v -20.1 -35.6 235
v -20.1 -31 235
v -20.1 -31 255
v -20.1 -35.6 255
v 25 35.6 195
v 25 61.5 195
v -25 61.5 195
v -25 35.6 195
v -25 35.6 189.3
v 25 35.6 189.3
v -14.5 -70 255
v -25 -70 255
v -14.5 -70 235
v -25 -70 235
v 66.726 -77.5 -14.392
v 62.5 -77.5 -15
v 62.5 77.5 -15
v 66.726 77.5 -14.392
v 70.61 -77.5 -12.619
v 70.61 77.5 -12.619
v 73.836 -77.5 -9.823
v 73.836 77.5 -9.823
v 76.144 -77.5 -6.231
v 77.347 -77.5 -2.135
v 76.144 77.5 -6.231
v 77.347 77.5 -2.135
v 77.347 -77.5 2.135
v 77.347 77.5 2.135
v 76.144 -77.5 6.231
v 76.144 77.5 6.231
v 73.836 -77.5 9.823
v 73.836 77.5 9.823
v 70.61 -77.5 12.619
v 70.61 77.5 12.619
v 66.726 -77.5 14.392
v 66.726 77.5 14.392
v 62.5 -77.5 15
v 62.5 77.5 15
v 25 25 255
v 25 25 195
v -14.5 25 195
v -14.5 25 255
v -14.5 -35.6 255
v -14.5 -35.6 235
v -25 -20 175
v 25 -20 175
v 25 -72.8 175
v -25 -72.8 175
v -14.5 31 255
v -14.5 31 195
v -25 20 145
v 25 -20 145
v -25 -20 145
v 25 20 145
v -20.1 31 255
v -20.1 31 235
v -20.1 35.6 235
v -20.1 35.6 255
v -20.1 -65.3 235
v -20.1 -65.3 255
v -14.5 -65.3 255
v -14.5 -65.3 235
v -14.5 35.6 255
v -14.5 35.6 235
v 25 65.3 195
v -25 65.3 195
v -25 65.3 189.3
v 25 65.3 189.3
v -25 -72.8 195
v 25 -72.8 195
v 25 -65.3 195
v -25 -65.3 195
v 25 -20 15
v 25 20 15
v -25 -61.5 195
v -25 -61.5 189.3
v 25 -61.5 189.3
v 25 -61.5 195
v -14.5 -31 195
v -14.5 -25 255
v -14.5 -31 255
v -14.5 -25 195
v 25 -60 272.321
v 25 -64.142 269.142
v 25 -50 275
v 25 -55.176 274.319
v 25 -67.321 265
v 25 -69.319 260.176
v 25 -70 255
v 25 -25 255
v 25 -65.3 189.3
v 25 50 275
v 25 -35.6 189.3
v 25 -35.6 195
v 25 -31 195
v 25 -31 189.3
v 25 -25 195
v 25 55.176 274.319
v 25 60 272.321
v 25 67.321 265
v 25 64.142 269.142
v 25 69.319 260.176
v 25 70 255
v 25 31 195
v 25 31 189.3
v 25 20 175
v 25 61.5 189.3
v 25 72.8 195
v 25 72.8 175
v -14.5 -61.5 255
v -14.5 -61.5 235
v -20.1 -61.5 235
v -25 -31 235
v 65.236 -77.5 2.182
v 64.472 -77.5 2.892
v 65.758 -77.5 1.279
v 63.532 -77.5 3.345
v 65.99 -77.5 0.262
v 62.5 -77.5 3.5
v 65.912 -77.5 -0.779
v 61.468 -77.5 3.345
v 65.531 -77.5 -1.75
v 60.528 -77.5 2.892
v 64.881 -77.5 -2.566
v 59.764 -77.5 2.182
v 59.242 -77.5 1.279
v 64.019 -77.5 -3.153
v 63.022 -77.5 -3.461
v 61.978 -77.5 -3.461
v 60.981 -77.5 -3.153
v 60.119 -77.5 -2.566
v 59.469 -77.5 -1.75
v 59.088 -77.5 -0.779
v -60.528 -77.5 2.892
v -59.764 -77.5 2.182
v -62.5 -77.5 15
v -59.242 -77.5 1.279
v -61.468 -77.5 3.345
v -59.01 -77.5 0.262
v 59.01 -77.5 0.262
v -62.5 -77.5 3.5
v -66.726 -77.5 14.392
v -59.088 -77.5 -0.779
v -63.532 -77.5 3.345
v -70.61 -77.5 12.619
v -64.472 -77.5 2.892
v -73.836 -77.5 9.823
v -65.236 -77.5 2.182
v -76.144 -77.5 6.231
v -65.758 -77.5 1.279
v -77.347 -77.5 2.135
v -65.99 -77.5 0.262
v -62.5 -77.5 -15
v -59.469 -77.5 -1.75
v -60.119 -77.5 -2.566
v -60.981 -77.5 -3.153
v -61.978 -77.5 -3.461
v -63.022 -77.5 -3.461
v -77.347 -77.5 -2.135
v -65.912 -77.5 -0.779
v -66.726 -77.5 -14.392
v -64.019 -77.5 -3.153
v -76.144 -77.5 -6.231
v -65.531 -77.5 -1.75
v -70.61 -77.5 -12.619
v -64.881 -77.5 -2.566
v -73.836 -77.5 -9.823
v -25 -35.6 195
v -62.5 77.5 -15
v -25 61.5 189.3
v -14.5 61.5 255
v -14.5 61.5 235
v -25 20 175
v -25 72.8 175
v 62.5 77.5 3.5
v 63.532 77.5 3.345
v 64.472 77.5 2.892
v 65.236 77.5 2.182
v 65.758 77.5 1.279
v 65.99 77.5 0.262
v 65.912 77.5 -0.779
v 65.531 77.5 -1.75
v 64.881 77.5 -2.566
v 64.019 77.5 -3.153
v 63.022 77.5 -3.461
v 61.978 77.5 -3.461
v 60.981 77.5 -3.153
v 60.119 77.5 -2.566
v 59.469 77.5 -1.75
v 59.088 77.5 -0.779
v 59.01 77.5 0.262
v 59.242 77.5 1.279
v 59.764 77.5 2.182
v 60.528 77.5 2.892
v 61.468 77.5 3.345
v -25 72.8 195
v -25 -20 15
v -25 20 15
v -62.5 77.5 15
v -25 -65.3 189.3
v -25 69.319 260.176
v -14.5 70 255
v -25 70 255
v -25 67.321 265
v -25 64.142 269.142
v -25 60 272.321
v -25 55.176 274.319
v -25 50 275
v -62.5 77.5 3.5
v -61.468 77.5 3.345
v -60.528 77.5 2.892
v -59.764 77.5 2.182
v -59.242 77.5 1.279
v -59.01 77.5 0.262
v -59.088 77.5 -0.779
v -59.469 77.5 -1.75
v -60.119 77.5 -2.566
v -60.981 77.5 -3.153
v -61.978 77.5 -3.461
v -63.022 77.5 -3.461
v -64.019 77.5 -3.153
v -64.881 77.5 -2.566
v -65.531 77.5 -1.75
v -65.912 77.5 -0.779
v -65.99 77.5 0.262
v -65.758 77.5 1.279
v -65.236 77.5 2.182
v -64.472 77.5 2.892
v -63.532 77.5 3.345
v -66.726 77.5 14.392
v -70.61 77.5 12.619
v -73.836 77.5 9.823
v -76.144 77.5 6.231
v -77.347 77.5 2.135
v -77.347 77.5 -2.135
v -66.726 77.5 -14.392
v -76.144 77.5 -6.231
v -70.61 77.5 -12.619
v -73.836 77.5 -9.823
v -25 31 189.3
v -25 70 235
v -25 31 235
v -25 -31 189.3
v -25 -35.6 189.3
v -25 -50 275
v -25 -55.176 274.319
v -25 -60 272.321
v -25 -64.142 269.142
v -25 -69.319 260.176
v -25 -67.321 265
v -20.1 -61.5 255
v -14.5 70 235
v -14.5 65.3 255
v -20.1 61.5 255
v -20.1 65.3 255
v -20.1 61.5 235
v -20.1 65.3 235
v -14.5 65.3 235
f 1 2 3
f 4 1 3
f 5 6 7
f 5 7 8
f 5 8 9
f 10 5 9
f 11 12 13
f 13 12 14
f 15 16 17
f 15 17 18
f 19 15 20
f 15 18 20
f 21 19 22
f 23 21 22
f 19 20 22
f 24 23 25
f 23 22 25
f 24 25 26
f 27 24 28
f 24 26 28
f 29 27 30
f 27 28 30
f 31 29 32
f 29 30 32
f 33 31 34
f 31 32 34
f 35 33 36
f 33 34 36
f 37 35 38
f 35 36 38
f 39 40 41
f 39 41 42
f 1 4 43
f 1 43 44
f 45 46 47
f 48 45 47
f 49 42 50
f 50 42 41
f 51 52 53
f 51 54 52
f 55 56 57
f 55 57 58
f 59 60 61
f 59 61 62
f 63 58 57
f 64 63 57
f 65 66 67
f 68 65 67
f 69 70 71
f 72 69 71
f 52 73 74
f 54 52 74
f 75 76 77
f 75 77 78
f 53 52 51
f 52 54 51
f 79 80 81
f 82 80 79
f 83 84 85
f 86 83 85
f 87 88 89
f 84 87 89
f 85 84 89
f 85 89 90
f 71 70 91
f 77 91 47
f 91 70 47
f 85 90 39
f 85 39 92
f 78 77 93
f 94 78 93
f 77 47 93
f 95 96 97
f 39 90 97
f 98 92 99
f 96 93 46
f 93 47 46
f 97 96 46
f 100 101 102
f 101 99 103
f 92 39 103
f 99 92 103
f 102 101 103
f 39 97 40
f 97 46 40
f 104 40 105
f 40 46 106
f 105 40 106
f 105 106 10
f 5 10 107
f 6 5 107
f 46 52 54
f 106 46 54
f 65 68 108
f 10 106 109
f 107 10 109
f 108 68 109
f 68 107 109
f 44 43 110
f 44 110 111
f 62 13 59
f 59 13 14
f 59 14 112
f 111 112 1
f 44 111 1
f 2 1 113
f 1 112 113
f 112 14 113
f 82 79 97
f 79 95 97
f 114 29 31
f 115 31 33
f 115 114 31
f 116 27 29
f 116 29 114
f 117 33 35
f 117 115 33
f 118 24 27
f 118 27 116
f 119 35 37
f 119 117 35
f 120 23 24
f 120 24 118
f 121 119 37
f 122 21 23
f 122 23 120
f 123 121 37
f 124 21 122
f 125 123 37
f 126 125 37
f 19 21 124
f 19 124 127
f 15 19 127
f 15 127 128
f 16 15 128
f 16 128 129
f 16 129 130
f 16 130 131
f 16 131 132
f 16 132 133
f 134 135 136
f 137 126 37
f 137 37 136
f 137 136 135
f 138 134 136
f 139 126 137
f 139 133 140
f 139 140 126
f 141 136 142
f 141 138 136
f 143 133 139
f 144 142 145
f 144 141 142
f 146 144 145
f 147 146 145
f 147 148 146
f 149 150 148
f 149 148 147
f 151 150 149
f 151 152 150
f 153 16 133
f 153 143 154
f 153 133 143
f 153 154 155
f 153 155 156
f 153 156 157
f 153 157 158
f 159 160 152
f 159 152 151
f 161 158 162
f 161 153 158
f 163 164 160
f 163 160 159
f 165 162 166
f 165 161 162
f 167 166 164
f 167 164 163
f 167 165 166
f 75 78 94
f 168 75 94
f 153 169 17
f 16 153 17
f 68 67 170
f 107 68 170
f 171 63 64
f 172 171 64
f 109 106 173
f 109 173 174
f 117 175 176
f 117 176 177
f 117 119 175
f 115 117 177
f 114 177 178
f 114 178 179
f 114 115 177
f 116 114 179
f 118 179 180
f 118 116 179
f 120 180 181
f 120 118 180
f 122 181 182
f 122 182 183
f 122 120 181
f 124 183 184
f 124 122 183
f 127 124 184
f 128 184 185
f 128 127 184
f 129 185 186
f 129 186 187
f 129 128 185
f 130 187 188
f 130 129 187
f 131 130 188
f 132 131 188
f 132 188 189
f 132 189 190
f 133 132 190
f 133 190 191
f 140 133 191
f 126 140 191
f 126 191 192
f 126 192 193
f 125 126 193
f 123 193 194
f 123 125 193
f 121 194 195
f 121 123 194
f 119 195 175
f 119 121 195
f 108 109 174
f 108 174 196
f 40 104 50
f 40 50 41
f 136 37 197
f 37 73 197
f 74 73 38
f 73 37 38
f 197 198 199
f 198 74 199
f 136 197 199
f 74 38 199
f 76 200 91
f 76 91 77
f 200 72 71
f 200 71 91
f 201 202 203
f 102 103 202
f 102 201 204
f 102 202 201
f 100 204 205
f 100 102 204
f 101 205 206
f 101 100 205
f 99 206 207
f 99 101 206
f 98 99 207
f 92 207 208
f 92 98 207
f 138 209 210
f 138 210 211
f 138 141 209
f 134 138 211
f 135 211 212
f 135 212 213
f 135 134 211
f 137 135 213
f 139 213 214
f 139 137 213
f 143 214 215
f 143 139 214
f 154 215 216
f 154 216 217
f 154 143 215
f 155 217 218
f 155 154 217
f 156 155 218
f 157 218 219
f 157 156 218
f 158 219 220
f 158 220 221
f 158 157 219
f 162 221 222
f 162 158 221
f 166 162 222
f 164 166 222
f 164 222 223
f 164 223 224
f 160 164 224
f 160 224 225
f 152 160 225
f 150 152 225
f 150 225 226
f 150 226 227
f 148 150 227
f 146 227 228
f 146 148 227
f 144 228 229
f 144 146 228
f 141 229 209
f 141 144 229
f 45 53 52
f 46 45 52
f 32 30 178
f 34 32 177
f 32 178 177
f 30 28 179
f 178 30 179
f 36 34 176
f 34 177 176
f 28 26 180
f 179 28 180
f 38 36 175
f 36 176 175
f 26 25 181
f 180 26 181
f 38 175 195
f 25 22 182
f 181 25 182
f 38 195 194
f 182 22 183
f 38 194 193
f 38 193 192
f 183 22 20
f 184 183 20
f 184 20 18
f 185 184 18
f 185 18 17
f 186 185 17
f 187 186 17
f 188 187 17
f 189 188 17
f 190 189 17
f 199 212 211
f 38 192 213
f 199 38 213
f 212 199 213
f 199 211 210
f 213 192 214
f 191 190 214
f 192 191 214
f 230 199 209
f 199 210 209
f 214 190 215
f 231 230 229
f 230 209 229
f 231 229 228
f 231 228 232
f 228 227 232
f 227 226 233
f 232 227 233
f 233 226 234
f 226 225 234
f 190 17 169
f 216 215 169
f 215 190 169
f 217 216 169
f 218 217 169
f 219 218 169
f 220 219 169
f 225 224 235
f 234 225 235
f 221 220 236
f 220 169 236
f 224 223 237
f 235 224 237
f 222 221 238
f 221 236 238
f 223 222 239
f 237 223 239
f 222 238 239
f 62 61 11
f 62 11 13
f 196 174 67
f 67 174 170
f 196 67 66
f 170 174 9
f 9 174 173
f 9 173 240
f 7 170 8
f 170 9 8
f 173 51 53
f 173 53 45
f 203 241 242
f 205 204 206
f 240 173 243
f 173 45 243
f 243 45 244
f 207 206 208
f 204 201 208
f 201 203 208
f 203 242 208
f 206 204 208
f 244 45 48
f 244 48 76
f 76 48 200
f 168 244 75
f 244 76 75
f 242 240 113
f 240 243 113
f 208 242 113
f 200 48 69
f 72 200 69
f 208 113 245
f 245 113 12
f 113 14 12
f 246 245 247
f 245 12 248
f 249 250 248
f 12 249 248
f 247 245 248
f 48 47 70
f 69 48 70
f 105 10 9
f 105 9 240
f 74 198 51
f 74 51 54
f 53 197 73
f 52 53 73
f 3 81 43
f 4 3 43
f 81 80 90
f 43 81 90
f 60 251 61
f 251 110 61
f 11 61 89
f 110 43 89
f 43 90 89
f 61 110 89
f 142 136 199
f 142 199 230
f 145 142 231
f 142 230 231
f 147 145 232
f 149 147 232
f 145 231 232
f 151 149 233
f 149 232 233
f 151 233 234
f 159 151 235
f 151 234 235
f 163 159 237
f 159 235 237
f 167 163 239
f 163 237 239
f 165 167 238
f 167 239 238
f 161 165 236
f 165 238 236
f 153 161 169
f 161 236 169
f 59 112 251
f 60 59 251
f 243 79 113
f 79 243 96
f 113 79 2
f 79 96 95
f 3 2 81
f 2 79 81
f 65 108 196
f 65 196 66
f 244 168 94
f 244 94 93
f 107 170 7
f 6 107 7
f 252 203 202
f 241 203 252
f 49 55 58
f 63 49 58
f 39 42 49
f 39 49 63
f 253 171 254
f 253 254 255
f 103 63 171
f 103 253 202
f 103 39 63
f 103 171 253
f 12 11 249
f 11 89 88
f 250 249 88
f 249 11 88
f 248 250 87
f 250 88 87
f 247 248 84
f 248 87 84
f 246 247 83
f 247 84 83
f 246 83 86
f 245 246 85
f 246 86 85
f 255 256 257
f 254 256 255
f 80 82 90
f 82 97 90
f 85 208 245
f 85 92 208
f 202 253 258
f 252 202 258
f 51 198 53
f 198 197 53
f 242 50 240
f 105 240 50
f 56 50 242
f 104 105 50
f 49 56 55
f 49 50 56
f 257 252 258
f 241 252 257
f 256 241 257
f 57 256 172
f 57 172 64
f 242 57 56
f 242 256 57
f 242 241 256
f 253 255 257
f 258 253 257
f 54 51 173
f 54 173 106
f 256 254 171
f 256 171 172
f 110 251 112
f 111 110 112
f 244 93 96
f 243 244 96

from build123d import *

# Parameters (mm, degrees)
SKETCH1_R                       = 3.5
BOSS_EXTRUDE1_DEPTH             = 77.5
SKETCH2_W                       = 50
SKETCH2_H                       = 40
BOSS_EXTRUDE2_DEPTH             = 260
BOSS_EXTRUDE4_REACH             = 298.036
BOSS_EXTRUDE4_DIRECTION_2_REACH = 298.036
SKETCH6_W                       = 20
SKETCH6_H                       = 45
BOSS_EXTRUDE5_DEPTH             = 4.9
SKETCH9_W                       = 20
SKETCH9_H                       = 4.7
SKETCH9_W_2                     = 60
SKETCH9_H_2                     = 6
SKETCH9_H_3                     = 25.9
BOSS_EXTRUDE7_DEPTH             = 5.6
SKETCH11_W                      = 40
SKETCH11_H                      = 6
BOSS_EXTRUDE8_DEPTH             = 4.9


with BuildPart() as part:
    # Sketch1 → Boss-Extrude1 (new, symmetric)
    with BuildSketch(Plane(origin=(0, 0, 0), x_dir=(1, 0, 0), z_dir=(0, 1, 0))):
        with BuildLine():
            Line((-62.5, 15), (62.5, 15))
            ThreePointArc((62.5, 15), (77.5, 0), (62.5, -15))
            Line((62.5, -15), (-62.5, -15))
            ThreePointArc((-62.5, -15), (-77.5, 0), (-62.5, 15))
        make_face()
        with Locations(Location((-62.5, 0, 0), (0, 0, 270))):
            Circle(SKETCH1_R, mode=Mode.SUBTRACT)
        with Locations(Location((62.5, 0, 0), (0, 0, 270))):
            Circle(SKETCH1_R, mode=Mode.SUBTRACT)
    extrude(amount=BOSS_EXTRUDE1_DEPTH, both=True)

    # Sketch2 → Boss-Extrude2 (add)
    with BuildSketch(Plane.XY.offset(15)):
        Rectangle(SKETCH2_W, SKETCH2_H)
    extrude(amount=BOSS_EXTRUDE2_DEPTH)

    # Boss-Extrude4: up to this face of the body (flat: up to its plane)
    boss_extrude4_end = Plane(part.part.faces().sort_by_distance((25, 0, 145))[0])
    # Sketch5 → Boss-Extrude4 (add, up to the picked face)
    with BuildSketch(Plane(origin=(0, 0, 0), x_dir=(0, 0, -1), z_dir=(1, 0, 0)), mode=Mode.PRIVATE) as boss_extrude4_sk1:
        with BuildLine():
            Line((-275, -20), (-175, -20))
            Line((-175, -20), (-175, -72.8))
            Line((-175, -72.8), (-195, -72.8))
            Line((-195, -72.8), (-195, -65.3))
            Line((-195, -65.3), (-189.3, -65.3))
            Line((-189.3, -65.3), (-189.3, -61.5))
            Line((-189.3, -61.5), (-195, -61.5))
            Line((-195, -61.5), (-195, -35.6))
            Line((-195, -35.6), (-189.3, -35.6))
            Line((-189.3, -35.6), (-189.3, -31))
            Line((-189.3, -31), (-195, -31))
            Line((-195, -31), (-195, -25))
            Line((-195, -25), (-255, -25))
            Line((-255, -25), (-255, -70))
            ThreePointArc((-255, -70), (-269.142135624, -64.142135624), (-275, -50))
            Line((-275, -50), (-275, -20))
        make_face()
    boss_extrude4_tool1 = split(extrude(boss_extrude4_sk1.sketch, amount=BOSS_EXTRUDE4_REACH, mode=Mode.PRIVATE), bisect_by=boss_extrude4_end, keep=Keep.BOTH, mode=Mode.PRIVATE)
    boss_extrude4 = boss_extrude4_tool1.solids().sort_by(Axis((0, -21.130833, 225), (1, 0, 0)))[0]
    add(boss_extrude4)

    # Boss-Extrude4 direction 2: up to this face of the body (flat: up to its plane)
    boss_extrude4_direction_2_end = Plane(part.part.faces().sort_by_distance((-25, 0, 145))[0])
    # Sketch5 → Boss-Extrude4 direction 2 (add, up to the picked face)
    with BuildSketch(Plane(origin=(0, 0, 0), x_dir=(0, 0, -1), z_dir=(1, 0, 0)), mode=Mode.PRIVATE) as boss_extrude4_direction_2_sk1:
        with BuildLine():
            Line((-275, -20), (-175, -20))
            Line((-175, -20), (-175, -72.8))
            Line((-175, -72.8), (-195, -72.8))
            Line((-195, -72.8), (-195, -65.3))
            Line((-195, -65.3), (-189.3, -65.3))
            Line((-189.3, -65.3), (-189.3, -61.5))
            Line((-189.3, -61.5), (-195, -61.5))
            Line((-195, -61.5), (-195, -35.6))
            Line((-195, -35.6), (-189.3, -35.6))
            Line((-189.3, -35.6), (-189.3, -31))
            Line((-189.3, -31), (-195, -31))
            Line((-195, -31), (-195, -25))
            Line((-195, -25), (-255, -25))
            Line((-255, -25), (-255, -70))
            ThreePointArc((-255, -70), (-269.142135624, -64.142135624), (-275, -50))
            Line((-275, -50), (-275, -20))
        make_face()
    boss_extrude4_direction_2_tool1 = split(extrude(boss_extrude4_direction_2_sk1.sketch, amount=-BOSS_EXTRUDE4_DIRECTION_2_REACH, mode=Mode.PRIVATE), bisect_by=boss_extrude4_direction_2_end, keep=Keep.BOTH, mode=Mode.PRIVATE)
    boss_extrude4_direction_2 = boss_extrude4_direction_2_tool1.solids().sort_by(Axis((0, -21.130833, 225), (-1, 0, 0)))[0]
    add(boss_extrude4_direction_2)

    # Sketch6 → Boss-Extrude5 (add)
    with BuildSketch(Plane.ZY.offset(25)):
        with Locations((245, -47.5)):
            Rectangle(SKETCH6_W, SKETCH6_H)
    boss_extrude5 = extrude(amount=-BOSS_EXTRUDE5_DEPTH)

    # Mirror1: Boss-Extrude4, Boss-Extrude4 direction 2, Boss-Extrude5 across plane
    add(boss_extrude4.mirror(Plane.ZX))
    add(boss_extrude4_direction_2.mirror(Plane.ZX))
    add(boss_extrude5.mirror(Plane.ZX))

    # Sketch9 → Boss-Extrude7 (add)
    with BuildSketch(Plane(origin=(-20.1, 0, 0), x_dir=(0, 0, -1), z_dir=(1, 0, 0))):
        with Locations((-245, -67.65)):
            Rectangle(SKETCH9_W, SKETCH9_H)
        with Locations((-225, -28)):
            Rectangle(SKETCH9_W_2, SKETCH9_H_2)
        with Locations((-245, -48.55)):
            Rectangle(SKETCH9_W, SKETCH9_H_3)
    boss_extrude7 = extrude(amount=BOSS_EXTRUDE7_DEPTH)

    # Sketch11 → Boss-Extrude8 (add)
    with BuildSketch(Plane.ZY.offset(20.1)):
        with Locations((215, -28)):
            Rectangle(SKETCH11_W, SKETCH11_H)
    boss_extrude8 = extrude(amount=BOSS_EXTRUDE8_DEPTH)

    # Mirror2: Boss-Extrude7, Boss-Extrude8 across plane
    add(boss_extrude7.mirror(Plane.ZX))
    add(boss_extrude8.mirror(Plane.ZX))


with BuildPart() as body_2:
    # Split1: the piece on the far side of the plane
    add(part.part)
    split(bisect_by=Plane(origin=(0, 0, 145), x_dir=(-1, 0, 0), z_dir=(0, 0, -1)), keep=Keep.BOTTOM)


with BuildPart() as part_1:
    add(part.part)

    # Split1
    split(bisect_by=Plane(origin=(0, 0, 145), x_dir=(-1, 0, 0), z_dir=(0, 0, -1)), keep=Keep.TOP)


solid = Compound([body_2.part, part_1.part])
